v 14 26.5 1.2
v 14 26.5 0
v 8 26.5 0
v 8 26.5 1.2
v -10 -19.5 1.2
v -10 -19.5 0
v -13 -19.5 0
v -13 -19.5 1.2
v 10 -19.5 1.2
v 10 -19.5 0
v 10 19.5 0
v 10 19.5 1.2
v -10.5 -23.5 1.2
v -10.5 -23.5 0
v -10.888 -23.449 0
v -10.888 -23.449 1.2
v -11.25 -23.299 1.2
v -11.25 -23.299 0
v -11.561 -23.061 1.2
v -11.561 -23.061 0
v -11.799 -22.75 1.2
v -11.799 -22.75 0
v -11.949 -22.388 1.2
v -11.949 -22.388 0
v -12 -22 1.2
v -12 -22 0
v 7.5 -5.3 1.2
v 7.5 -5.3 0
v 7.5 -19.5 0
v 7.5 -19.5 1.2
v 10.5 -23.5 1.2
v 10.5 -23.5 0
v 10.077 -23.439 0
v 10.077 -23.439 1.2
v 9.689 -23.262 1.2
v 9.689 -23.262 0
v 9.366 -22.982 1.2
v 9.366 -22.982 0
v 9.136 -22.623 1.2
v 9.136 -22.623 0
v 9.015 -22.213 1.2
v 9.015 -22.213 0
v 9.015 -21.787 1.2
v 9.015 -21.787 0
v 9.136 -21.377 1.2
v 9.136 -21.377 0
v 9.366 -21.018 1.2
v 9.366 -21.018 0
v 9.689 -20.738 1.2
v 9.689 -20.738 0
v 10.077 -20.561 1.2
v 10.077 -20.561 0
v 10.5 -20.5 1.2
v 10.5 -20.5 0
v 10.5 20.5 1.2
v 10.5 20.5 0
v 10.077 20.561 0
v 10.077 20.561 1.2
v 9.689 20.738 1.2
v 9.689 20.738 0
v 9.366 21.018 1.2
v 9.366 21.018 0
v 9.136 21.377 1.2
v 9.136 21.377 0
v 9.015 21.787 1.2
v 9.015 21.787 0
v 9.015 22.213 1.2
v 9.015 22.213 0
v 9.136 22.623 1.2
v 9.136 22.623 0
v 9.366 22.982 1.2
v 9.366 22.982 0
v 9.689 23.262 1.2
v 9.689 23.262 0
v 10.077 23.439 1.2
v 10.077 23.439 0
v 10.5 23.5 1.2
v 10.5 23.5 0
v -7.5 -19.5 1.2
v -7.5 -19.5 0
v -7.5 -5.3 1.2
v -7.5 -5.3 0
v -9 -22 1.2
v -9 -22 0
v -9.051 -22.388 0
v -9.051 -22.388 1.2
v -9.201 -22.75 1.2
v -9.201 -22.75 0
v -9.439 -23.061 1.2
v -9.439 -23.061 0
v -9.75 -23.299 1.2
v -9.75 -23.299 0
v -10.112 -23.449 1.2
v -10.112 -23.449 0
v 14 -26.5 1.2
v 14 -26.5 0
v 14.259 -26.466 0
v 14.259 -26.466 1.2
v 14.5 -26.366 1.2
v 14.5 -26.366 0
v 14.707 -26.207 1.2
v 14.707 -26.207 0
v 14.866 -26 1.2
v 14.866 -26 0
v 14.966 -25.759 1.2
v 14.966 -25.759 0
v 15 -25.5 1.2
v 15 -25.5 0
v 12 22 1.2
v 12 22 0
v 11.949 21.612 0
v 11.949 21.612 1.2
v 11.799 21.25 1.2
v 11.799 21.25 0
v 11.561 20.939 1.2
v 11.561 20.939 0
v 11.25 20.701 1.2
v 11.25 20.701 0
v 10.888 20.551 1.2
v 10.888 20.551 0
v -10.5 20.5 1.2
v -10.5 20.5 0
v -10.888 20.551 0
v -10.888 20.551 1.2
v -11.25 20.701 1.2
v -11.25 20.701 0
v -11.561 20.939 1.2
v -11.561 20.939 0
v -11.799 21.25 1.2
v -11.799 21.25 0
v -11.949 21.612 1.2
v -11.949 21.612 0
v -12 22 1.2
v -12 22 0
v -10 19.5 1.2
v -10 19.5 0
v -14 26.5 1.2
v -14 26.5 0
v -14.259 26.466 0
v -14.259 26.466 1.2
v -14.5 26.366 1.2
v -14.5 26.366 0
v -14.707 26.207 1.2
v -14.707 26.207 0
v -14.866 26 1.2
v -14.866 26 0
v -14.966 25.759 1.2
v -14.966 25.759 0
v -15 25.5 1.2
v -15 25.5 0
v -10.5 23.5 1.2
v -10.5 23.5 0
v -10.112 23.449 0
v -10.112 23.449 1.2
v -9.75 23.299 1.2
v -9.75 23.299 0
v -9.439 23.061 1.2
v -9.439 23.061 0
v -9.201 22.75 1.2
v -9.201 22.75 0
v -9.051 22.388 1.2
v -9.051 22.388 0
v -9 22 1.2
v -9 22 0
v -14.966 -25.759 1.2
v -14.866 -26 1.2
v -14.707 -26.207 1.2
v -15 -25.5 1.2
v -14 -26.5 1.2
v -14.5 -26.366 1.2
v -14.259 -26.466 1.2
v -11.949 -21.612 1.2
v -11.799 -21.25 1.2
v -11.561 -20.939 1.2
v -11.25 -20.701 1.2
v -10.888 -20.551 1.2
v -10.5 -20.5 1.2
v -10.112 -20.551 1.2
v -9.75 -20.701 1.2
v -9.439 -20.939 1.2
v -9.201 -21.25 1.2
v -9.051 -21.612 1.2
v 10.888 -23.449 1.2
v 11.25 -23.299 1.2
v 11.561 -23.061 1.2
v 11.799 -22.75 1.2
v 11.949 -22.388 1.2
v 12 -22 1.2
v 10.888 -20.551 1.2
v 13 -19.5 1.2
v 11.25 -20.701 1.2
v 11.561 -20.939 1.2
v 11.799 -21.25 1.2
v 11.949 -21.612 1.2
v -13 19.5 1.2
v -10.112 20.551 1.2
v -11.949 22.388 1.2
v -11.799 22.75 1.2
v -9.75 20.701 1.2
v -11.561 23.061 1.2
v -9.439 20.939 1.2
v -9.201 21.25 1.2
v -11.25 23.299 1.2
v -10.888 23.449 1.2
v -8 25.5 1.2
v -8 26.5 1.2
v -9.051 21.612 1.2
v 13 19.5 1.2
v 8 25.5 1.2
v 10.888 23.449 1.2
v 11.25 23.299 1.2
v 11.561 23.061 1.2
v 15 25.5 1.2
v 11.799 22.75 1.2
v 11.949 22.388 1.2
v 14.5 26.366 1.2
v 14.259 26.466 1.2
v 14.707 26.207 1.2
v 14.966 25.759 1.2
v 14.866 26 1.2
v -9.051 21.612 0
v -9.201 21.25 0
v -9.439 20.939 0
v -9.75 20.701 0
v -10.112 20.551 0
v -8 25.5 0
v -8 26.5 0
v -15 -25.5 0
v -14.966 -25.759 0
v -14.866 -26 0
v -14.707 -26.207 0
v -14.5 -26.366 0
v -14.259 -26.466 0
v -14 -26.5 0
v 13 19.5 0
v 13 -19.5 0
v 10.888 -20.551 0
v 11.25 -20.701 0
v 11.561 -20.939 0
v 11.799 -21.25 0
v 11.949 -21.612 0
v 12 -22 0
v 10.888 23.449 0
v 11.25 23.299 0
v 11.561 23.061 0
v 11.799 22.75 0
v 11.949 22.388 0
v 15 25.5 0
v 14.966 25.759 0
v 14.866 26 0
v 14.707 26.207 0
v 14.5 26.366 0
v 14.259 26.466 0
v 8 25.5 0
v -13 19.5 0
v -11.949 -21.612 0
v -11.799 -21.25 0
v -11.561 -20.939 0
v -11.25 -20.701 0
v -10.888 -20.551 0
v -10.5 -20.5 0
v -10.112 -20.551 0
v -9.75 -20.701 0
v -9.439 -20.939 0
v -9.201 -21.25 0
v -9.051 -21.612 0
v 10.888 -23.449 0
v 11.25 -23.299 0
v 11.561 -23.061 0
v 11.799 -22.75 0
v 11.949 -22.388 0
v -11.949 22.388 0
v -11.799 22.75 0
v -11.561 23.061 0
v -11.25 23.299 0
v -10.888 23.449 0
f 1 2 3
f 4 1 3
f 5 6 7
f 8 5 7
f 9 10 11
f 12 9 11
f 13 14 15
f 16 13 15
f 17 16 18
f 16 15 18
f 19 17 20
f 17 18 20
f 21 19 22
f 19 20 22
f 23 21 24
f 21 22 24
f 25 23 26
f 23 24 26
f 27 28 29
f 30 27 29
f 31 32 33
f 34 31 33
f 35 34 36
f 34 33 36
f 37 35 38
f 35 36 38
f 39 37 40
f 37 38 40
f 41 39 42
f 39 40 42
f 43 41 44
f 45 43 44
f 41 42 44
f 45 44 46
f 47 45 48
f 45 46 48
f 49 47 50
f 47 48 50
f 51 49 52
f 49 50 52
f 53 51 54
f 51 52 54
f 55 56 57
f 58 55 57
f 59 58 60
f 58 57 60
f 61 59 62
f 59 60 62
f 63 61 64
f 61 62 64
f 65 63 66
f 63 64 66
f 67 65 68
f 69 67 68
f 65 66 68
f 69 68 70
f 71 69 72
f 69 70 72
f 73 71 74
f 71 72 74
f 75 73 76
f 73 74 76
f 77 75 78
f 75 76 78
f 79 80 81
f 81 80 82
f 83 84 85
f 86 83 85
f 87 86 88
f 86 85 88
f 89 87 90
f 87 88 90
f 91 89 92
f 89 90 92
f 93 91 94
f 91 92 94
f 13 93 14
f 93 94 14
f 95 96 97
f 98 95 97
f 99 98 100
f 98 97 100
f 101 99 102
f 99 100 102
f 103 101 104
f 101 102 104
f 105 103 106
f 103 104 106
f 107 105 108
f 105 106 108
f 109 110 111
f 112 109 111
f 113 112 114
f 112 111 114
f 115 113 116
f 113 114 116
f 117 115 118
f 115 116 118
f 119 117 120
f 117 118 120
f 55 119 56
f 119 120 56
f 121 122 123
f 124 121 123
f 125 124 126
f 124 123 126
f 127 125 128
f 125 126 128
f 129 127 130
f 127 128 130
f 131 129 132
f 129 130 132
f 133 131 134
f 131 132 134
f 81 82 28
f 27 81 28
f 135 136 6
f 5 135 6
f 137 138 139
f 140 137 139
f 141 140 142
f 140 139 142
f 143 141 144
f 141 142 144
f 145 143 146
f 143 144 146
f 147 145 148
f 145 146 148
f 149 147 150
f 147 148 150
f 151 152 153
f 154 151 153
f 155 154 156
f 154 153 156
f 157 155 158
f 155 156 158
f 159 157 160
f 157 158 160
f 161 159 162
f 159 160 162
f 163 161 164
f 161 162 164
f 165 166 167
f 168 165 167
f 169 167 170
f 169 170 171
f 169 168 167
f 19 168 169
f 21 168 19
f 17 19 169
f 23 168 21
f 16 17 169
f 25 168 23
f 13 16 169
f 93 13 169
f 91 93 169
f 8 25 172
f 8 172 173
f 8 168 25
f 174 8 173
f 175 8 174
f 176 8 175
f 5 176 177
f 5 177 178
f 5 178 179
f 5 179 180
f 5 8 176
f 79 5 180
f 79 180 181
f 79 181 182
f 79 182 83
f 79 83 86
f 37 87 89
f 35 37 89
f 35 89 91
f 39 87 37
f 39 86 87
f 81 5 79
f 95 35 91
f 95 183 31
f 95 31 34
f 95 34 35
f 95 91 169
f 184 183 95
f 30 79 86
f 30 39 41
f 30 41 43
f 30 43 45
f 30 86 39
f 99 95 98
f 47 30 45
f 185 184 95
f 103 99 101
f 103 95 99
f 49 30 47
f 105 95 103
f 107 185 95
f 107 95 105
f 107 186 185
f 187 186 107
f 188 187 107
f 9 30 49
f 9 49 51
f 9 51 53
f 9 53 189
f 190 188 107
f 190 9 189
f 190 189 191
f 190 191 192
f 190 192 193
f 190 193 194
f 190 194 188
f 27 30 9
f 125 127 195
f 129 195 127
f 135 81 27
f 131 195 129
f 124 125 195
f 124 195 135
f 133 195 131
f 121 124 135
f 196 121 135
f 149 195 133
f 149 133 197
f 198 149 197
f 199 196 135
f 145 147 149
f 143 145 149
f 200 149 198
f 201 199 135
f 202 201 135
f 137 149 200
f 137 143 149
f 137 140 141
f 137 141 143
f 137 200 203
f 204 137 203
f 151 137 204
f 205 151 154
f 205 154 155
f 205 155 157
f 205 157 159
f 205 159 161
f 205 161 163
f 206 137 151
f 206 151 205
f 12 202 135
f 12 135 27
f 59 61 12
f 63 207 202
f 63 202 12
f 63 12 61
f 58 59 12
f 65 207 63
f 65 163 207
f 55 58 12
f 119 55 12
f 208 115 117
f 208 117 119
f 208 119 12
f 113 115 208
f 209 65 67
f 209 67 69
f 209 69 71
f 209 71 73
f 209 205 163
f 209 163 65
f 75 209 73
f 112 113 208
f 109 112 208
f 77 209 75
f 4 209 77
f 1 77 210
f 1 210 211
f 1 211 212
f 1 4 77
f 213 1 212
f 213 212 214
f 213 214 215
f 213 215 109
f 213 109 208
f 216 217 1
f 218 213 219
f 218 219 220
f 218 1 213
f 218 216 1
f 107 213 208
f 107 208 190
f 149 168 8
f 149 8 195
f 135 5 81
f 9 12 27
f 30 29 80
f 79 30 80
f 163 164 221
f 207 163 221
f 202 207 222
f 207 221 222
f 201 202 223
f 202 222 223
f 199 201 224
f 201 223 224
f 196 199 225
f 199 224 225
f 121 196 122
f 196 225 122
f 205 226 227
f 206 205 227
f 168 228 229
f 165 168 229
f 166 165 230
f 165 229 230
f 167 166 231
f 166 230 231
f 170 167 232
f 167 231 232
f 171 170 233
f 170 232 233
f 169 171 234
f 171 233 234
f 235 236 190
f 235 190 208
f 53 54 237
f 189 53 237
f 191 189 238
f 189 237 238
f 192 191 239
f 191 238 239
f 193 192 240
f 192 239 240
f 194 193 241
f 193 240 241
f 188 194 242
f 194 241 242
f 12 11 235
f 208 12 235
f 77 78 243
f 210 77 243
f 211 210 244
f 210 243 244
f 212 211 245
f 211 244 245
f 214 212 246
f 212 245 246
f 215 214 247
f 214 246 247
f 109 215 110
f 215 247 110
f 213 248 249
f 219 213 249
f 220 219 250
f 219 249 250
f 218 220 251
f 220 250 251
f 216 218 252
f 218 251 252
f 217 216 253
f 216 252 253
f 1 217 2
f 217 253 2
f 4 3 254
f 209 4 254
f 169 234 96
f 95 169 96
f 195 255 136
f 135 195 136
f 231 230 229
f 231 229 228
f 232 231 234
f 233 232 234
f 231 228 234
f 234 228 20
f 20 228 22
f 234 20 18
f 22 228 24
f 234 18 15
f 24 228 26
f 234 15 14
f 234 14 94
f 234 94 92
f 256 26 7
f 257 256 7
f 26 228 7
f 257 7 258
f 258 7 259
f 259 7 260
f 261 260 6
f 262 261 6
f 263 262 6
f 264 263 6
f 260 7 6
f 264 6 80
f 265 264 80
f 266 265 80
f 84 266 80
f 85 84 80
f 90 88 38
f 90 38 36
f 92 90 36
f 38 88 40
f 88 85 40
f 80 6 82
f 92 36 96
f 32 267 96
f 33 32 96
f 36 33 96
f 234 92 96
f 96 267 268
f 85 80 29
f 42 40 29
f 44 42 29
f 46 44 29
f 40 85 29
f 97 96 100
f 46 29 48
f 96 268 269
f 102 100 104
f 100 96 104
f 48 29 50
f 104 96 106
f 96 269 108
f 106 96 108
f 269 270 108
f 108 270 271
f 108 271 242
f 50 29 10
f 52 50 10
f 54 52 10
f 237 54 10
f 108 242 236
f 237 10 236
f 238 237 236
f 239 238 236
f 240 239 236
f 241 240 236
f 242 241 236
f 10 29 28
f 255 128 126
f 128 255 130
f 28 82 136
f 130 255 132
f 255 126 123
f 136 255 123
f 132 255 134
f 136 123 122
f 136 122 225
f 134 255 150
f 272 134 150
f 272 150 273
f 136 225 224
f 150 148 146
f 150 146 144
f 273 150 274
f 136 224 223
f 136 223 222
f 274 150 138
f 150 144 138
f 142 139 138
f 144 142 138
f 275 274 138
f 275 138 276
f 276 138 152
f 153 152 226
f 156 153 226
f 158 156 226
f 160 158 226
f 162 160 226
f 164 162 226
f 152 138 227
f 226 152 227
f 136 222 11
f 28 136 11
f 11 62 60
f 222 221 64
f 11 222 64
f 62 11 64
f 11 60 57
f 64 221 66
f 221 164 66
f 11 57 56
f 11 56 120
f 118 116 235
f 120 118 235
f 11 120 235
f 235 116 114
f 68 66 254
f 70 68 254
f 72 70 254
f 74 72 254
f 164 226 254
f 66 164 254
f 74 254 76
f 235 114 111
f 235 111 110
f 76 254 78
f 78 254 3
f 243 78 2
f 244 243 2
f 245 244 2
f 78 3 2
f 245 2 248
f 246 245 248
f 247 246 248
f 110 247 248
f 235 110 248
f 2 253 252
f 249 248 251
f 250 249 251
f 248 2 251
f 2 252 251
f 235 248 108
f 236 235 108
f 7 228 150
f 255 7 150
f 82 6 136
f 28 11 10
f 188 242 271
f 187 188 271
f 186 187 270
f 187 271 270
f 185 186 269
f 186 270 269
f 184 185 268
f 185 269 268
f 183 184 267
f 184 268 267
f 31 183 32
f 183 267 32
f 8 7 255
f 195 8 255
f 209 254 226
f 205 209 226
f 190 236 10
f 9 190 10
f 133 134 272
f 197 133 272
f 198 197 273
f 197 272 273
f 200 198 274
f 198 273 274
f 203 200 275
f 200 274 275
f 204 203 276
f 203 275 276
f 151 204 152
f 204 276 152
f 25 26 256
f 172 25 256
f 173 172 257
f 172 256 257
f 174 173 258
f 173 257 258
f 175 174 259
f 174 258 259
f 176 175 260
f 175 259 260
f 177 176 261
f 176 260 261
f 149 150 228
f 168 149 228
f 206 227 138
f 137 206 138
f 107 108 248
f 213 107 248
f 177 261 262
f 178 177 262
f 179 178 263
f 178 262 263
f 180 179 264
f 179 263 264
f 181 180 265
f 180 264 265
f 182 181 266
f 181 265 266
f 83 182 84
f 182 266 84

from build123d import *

# Parameters (mm, degrees)
F0_W     = 4
F0_H     = 1
F0_W_2   = 2
F0_H_2   = 39
F0_W_3   = 2.5
F0_H_3   = 0.8
F0_W_4   = 7.5
F0_W_5   = 0.5
F1_DEPTH = 1.2


with BuildPart() as f1:
    # F0 (on Top) → F1 (new body)
    with BuildSketch(Plane.XY):
        with BuildLine():
            Line((-13, 24.5), (-12, 24.5))
            Line((-12, 24.5), (-10.5, 24.5))
            Line((-10.5, 24.5), (-8, 24.5))
            Line((-8, 24.5), (-8, 25.5))
            Line((-8, 25.5), (-8, 26.5))
            Line((-8, 26.5), (-14, 26.5))
            ThreePointArc((-14, 26.5), (-14.7071067812, 26.2071067812), (-15, 25.5))
            Line((-15, 25.5), (-15, 19.5))
            Line((-15, 19.5), (-13, 19.5))
            Line((-13, 19.5), (-13, 22))
            Line((-13, 22), (-13, 23.5))
            Line((-13, 23.5), (-13, 24.5))
        make_face()
        with BuildLine():
            Line((-10.5, 24.5), (-12, 24.5))
            ThreePointArc((-12, 24.5), (-12.7071067812, 24.2071067812), (-13, 23.5))
            Line((-13, 23.5), (-13, 22))
            Line((-13, 22), (-12, 22))
            ThreePointArc((-12, 22), (-11.5606601718, 23.0606601718), (-10.5, 23.5))
            Line((-10.5, 23.5), (-10.5, 24.5))
        make_face()
        with BuildLine():
            ThreePointArc((-13, 23.5), (-12.7071067812, 24.2071067812), (-12, 24.5))
            Line((-12, 24.5), (-13, 24.5))
            Line((-13, 24.5), (-13, 23.5))
        make_face()
        with BuildLine():
            Line((-8, 24.5), (-10.5, 24.5))
            Line((-10.5, 24.5), (-10.5, 23.5))
            ThreePointArc((-10.5, 23.5), (-9.4393398282, 23.0606601718), (-9, 22))
            ThreePointArc((-9, 22), (-9.4393398282, 20.9393398282), (-10.5, 20.5))
            Line((-10.5, 20.5), (-10.5, 19.5))
            Line((-10.5, 19.5), (-10, 19.5))
            Line((-10, 19.5), (10, 19.5))
            Line((10, 19.5), (10.5, 19.5))
            Line((10.5, 19.5), (10.5, 20.5))
            ThreePointArc((10.5, 20.5), (9, 22), (10.5, 23.5))
            Line((10.5, 23.5), (10.5, 24.5))
            Line((10.5, 24.5), (8, 24.5))
            Line((8, 24.5), (4, 24.5))
            Line((4, 24.5), (4, 20))
            Line((4, 20), (-4, 20))
            Line((-4, 20), (-4, 24.5))
            Line((-4, 24.5), (-8, 24.5))
        make_face()
        with Locations((-6, 25)):
            Rectangle(F0_W, F0_H)
        with BuildLine():
            Line((-12, 22), (-13, 22))
            Line((-13, 22), (-13, 19.5))
            Line((-13, 19.5), (-10.5, 19.5))
            Line((-10.5, 19.5), (-10.5, 20.5))
            ThreePointArc((-10.5, 20.5), (-11.5606601718, 20.9393398282), (-12, 22))
        make_face()
        with Locations((-2, 25)):
            Rectangle(F0_W, F0_H)
        Polygon((0, 24.5), (-4, 24.5), (-4, 20), (4, 20), (4, 24.5), align=None)
        with Locations((-14, 0)):
            Rectangle(F0_W_2, F0_H_2)
        with Locations((2, 25)):
            Rectangle(F0_W, F0_H)
        with Locations((-11.75, -19.9)):
            Rectangle(F0_W_3, F0_H_3)
        with Locations((-14, -19.9)):
            Rectangle(F0_W_2, F0_H_3)
        with Locations((6, 25)):
            Rectangle(F0_W, F0_H)
        with BuildLine():
            Line((-10.5, -20.3), (-13, -20.3))
            Line((-13, -20.3), (-13, -22))
            Line((-13, -22), (-12, -22))
            ThreePointArc((-12, -22), (-11.5606601718, -20.9393398282), (-10.5, -20.5))
            Line((-10.5, -20.5), (-10.5, -20.3))
        make_face()
        with BuildLine():
            Line((-13, -22), (-13, -20.3))
            Line((-13, -20.3), (-15, -20.3))
            Line((-15, -20.3), (-15, -25.5))
            ThreePointArc((-15, -25.5), (-14.7071067812, -26.2071067812), (-14, -26.5))
            Line((-14, -26.5), (14, -26.5))
            ThreePointArc((14, -26.5), (14.7071067812, -26.2071067812), (15, -25.5))
            Line((15, -25.5), (15, -20.3))
            Line((15, -20.3), (13, -20.3))
            Line((13, -20.3), (13, -22))
            Line((13, -22), (13, -23.5))
            ThreePointArc((13, -23.5), (12.7071067812, -24.2071067812), (12, -24.5))
            Line((12, -24.5), (10.5, -24.5))
            Line((10.5, -24.5), (-10.5, -24.5))
            Line((-10.5, -24.5), (-12, -24.5))
            ThreePointArc((-12, -24.5), (-12.7071067812, -24.2071067812), (-13, -23.5))
            Line((-13, -23.5), (-13, -22))
        make_face()
        Polygon((-10, -19.5), (-10.5, -19.5), (-10.5, -20.3), (-7.5, -20.3), (-7.5, -19.5), align=None)
        Polygon((10, 19.5), (-10, 19.5), (-10, -19.5), (-7.5, -19.5), (-7.5, -5.3), (7.5, -5.3), (7.5, -19.5), (10, -19.5), (10, 19.1765315831), align=None)
        with BuildLine():
            Line((8, 25.5), (8, 24.5))
            Line((8, 24.5), (10.5, 24.5))
            Line((10.5, 24.5), (12, 24.5))
            ThreePointArc((12, 24.5), (12.7071067812, 24.2071067812), (13, 23.5))
            Line((13, 23.5), (13, 22))
            Line((13, 22), (13, 19.5))
            Line((13, 19.5), (15, 19.5))
            Line((15, 19.5), (15, 25.5))
            ThreePointArc((15, 25.5), (14.7071067812, 26.2071067812), (14, 26.5))
            Line((14, 26.5), (8, 26.5))
            Line((8, 26.5), (8, 25.5))
        make_face()
        with BuildLine():
            Line((-12, -22), (-13, -22))
            Line((-13, -22), (-13, -23.5))
            ThreePointArc((-13, -23.5), (-12.7071067812, -24.2071067812), (-12, -24.5))
            Line((-12, -24.5), (-10.5, -24.5))
            Line((-10.5, -24.5), (-10.5, -23.5))
            ThreePointArc((-10.5, -23.5), (-11.5606601718, -23.0606601718), (-12, -22))
        make_face()
        with BuildLine():
            Line((-7.5, -20.3), (-10.5, -20.3))
            Line((-10.5, -20.3), (-10.5, -20.5))
            ThreePointArc((-10.5, -20.5), (-9.4393398282, -20.9393398282), (-9, -22))
            ThreePointArc((-9, -22), (-9.4393398282, -23.0606601718), (-10.5, -23.5))
            Line((-10.5, -23.5), (-10.5, -24.5))
            Line((-10.5, -24.5), (10.5, -24.5))
            Line((10.5, -24.5), (10.5, -23.5))
            ThreePointArc((10.5, -23.5), (9, -22), (10.5, -20.5))
            Line((10.5, -20.5), (10.5, -20.3))
            Line((10.5, -20.3), (10, -20.3))
            Line((10, -20.3), (7.5, -20.3))
            Line((7.5, -20.3), (0, -20.3))
            Line((0, -20.3), (-7.5, -20.3))
        make_face()
        with BuildLine():
            Line((12, 24.5), (10.5, 24.5))
            Line((10.5, 24.5), (10.5, 23.5))
            ThreePointArc((10.5, 23.5), (11.5606601718, 23.0606601718), (12, 22))
            Line((12, 22), (13, 22))
            Line((13, 22), (13, 23.5))
            ThreePointArc((13, 23.5), (12.7071067812, 24.2071067812), (12, 24.5))
        make_face()
        with Locations((-3.75, -19.9)):
            Rectangle(F0_W_4, F0_H_3)
        with BuildLine():
            Line((10.5, 20.5), (10.5, 19.5))
            Line((10.5, 19.5), (13, 19.5))
            Line((13, 19.5), (13, 22))
            Line((13, 22), (12, 22))
            ThreePointArc((12, 22), (11.5606601718, 20.9393398282), (10.5, 20.5))
        make_face()
        with Locations((3.75, -19.9)):
            Rectangle(F0_W_4, F0_H_3)
        with Locations((8.75, -19.9)):
            Rectangle(F0_W_3, F0_H_3)
        with Locations((10.25, -19.9)):
            Rectangle(F0_W_5, F0_H_3)
        with Locations((14, 0)):
            Rectangle(F0_W_2, F0_H_2)
        with Locations((11.75, -19.9)):
            Rectangle(F0_W_3, F0_H_3)
        with Locations((14, -19.9)):
            Rectangle(F0_W_2, F0_H_3)
        with BuildLine():
            Line((10.5, -23.5), (10.5, -24.5))
            Line((10.5, -24.5), (12, -24.5))
            ThreePointArc((12, -24.5), (12.7071067812, -24.2071067812), (13, -23.5))
            Line((13, -23.5), (13, -22))
            Line((13, -22), (12, -22))
            ThreePointArc((12, -22), (11.5606601718, -23.0606601718), (10.5, -23.5))
        make_face()
        with BuildLine():
            Line((13, -20.3), (10.5, -20.3))
            Line((10.5, -20.3), (10.5, -20.5))
            ThreePointArc((10.5, -20.5), (11.5606601718, -20.9393398282), (12, -22))
            Line((12, -22), (13, -22))
            Line((13, -22), (13, -20.3))
        make_face()
    extrude(amount=F1_DEPTH)


solid = f1.part
